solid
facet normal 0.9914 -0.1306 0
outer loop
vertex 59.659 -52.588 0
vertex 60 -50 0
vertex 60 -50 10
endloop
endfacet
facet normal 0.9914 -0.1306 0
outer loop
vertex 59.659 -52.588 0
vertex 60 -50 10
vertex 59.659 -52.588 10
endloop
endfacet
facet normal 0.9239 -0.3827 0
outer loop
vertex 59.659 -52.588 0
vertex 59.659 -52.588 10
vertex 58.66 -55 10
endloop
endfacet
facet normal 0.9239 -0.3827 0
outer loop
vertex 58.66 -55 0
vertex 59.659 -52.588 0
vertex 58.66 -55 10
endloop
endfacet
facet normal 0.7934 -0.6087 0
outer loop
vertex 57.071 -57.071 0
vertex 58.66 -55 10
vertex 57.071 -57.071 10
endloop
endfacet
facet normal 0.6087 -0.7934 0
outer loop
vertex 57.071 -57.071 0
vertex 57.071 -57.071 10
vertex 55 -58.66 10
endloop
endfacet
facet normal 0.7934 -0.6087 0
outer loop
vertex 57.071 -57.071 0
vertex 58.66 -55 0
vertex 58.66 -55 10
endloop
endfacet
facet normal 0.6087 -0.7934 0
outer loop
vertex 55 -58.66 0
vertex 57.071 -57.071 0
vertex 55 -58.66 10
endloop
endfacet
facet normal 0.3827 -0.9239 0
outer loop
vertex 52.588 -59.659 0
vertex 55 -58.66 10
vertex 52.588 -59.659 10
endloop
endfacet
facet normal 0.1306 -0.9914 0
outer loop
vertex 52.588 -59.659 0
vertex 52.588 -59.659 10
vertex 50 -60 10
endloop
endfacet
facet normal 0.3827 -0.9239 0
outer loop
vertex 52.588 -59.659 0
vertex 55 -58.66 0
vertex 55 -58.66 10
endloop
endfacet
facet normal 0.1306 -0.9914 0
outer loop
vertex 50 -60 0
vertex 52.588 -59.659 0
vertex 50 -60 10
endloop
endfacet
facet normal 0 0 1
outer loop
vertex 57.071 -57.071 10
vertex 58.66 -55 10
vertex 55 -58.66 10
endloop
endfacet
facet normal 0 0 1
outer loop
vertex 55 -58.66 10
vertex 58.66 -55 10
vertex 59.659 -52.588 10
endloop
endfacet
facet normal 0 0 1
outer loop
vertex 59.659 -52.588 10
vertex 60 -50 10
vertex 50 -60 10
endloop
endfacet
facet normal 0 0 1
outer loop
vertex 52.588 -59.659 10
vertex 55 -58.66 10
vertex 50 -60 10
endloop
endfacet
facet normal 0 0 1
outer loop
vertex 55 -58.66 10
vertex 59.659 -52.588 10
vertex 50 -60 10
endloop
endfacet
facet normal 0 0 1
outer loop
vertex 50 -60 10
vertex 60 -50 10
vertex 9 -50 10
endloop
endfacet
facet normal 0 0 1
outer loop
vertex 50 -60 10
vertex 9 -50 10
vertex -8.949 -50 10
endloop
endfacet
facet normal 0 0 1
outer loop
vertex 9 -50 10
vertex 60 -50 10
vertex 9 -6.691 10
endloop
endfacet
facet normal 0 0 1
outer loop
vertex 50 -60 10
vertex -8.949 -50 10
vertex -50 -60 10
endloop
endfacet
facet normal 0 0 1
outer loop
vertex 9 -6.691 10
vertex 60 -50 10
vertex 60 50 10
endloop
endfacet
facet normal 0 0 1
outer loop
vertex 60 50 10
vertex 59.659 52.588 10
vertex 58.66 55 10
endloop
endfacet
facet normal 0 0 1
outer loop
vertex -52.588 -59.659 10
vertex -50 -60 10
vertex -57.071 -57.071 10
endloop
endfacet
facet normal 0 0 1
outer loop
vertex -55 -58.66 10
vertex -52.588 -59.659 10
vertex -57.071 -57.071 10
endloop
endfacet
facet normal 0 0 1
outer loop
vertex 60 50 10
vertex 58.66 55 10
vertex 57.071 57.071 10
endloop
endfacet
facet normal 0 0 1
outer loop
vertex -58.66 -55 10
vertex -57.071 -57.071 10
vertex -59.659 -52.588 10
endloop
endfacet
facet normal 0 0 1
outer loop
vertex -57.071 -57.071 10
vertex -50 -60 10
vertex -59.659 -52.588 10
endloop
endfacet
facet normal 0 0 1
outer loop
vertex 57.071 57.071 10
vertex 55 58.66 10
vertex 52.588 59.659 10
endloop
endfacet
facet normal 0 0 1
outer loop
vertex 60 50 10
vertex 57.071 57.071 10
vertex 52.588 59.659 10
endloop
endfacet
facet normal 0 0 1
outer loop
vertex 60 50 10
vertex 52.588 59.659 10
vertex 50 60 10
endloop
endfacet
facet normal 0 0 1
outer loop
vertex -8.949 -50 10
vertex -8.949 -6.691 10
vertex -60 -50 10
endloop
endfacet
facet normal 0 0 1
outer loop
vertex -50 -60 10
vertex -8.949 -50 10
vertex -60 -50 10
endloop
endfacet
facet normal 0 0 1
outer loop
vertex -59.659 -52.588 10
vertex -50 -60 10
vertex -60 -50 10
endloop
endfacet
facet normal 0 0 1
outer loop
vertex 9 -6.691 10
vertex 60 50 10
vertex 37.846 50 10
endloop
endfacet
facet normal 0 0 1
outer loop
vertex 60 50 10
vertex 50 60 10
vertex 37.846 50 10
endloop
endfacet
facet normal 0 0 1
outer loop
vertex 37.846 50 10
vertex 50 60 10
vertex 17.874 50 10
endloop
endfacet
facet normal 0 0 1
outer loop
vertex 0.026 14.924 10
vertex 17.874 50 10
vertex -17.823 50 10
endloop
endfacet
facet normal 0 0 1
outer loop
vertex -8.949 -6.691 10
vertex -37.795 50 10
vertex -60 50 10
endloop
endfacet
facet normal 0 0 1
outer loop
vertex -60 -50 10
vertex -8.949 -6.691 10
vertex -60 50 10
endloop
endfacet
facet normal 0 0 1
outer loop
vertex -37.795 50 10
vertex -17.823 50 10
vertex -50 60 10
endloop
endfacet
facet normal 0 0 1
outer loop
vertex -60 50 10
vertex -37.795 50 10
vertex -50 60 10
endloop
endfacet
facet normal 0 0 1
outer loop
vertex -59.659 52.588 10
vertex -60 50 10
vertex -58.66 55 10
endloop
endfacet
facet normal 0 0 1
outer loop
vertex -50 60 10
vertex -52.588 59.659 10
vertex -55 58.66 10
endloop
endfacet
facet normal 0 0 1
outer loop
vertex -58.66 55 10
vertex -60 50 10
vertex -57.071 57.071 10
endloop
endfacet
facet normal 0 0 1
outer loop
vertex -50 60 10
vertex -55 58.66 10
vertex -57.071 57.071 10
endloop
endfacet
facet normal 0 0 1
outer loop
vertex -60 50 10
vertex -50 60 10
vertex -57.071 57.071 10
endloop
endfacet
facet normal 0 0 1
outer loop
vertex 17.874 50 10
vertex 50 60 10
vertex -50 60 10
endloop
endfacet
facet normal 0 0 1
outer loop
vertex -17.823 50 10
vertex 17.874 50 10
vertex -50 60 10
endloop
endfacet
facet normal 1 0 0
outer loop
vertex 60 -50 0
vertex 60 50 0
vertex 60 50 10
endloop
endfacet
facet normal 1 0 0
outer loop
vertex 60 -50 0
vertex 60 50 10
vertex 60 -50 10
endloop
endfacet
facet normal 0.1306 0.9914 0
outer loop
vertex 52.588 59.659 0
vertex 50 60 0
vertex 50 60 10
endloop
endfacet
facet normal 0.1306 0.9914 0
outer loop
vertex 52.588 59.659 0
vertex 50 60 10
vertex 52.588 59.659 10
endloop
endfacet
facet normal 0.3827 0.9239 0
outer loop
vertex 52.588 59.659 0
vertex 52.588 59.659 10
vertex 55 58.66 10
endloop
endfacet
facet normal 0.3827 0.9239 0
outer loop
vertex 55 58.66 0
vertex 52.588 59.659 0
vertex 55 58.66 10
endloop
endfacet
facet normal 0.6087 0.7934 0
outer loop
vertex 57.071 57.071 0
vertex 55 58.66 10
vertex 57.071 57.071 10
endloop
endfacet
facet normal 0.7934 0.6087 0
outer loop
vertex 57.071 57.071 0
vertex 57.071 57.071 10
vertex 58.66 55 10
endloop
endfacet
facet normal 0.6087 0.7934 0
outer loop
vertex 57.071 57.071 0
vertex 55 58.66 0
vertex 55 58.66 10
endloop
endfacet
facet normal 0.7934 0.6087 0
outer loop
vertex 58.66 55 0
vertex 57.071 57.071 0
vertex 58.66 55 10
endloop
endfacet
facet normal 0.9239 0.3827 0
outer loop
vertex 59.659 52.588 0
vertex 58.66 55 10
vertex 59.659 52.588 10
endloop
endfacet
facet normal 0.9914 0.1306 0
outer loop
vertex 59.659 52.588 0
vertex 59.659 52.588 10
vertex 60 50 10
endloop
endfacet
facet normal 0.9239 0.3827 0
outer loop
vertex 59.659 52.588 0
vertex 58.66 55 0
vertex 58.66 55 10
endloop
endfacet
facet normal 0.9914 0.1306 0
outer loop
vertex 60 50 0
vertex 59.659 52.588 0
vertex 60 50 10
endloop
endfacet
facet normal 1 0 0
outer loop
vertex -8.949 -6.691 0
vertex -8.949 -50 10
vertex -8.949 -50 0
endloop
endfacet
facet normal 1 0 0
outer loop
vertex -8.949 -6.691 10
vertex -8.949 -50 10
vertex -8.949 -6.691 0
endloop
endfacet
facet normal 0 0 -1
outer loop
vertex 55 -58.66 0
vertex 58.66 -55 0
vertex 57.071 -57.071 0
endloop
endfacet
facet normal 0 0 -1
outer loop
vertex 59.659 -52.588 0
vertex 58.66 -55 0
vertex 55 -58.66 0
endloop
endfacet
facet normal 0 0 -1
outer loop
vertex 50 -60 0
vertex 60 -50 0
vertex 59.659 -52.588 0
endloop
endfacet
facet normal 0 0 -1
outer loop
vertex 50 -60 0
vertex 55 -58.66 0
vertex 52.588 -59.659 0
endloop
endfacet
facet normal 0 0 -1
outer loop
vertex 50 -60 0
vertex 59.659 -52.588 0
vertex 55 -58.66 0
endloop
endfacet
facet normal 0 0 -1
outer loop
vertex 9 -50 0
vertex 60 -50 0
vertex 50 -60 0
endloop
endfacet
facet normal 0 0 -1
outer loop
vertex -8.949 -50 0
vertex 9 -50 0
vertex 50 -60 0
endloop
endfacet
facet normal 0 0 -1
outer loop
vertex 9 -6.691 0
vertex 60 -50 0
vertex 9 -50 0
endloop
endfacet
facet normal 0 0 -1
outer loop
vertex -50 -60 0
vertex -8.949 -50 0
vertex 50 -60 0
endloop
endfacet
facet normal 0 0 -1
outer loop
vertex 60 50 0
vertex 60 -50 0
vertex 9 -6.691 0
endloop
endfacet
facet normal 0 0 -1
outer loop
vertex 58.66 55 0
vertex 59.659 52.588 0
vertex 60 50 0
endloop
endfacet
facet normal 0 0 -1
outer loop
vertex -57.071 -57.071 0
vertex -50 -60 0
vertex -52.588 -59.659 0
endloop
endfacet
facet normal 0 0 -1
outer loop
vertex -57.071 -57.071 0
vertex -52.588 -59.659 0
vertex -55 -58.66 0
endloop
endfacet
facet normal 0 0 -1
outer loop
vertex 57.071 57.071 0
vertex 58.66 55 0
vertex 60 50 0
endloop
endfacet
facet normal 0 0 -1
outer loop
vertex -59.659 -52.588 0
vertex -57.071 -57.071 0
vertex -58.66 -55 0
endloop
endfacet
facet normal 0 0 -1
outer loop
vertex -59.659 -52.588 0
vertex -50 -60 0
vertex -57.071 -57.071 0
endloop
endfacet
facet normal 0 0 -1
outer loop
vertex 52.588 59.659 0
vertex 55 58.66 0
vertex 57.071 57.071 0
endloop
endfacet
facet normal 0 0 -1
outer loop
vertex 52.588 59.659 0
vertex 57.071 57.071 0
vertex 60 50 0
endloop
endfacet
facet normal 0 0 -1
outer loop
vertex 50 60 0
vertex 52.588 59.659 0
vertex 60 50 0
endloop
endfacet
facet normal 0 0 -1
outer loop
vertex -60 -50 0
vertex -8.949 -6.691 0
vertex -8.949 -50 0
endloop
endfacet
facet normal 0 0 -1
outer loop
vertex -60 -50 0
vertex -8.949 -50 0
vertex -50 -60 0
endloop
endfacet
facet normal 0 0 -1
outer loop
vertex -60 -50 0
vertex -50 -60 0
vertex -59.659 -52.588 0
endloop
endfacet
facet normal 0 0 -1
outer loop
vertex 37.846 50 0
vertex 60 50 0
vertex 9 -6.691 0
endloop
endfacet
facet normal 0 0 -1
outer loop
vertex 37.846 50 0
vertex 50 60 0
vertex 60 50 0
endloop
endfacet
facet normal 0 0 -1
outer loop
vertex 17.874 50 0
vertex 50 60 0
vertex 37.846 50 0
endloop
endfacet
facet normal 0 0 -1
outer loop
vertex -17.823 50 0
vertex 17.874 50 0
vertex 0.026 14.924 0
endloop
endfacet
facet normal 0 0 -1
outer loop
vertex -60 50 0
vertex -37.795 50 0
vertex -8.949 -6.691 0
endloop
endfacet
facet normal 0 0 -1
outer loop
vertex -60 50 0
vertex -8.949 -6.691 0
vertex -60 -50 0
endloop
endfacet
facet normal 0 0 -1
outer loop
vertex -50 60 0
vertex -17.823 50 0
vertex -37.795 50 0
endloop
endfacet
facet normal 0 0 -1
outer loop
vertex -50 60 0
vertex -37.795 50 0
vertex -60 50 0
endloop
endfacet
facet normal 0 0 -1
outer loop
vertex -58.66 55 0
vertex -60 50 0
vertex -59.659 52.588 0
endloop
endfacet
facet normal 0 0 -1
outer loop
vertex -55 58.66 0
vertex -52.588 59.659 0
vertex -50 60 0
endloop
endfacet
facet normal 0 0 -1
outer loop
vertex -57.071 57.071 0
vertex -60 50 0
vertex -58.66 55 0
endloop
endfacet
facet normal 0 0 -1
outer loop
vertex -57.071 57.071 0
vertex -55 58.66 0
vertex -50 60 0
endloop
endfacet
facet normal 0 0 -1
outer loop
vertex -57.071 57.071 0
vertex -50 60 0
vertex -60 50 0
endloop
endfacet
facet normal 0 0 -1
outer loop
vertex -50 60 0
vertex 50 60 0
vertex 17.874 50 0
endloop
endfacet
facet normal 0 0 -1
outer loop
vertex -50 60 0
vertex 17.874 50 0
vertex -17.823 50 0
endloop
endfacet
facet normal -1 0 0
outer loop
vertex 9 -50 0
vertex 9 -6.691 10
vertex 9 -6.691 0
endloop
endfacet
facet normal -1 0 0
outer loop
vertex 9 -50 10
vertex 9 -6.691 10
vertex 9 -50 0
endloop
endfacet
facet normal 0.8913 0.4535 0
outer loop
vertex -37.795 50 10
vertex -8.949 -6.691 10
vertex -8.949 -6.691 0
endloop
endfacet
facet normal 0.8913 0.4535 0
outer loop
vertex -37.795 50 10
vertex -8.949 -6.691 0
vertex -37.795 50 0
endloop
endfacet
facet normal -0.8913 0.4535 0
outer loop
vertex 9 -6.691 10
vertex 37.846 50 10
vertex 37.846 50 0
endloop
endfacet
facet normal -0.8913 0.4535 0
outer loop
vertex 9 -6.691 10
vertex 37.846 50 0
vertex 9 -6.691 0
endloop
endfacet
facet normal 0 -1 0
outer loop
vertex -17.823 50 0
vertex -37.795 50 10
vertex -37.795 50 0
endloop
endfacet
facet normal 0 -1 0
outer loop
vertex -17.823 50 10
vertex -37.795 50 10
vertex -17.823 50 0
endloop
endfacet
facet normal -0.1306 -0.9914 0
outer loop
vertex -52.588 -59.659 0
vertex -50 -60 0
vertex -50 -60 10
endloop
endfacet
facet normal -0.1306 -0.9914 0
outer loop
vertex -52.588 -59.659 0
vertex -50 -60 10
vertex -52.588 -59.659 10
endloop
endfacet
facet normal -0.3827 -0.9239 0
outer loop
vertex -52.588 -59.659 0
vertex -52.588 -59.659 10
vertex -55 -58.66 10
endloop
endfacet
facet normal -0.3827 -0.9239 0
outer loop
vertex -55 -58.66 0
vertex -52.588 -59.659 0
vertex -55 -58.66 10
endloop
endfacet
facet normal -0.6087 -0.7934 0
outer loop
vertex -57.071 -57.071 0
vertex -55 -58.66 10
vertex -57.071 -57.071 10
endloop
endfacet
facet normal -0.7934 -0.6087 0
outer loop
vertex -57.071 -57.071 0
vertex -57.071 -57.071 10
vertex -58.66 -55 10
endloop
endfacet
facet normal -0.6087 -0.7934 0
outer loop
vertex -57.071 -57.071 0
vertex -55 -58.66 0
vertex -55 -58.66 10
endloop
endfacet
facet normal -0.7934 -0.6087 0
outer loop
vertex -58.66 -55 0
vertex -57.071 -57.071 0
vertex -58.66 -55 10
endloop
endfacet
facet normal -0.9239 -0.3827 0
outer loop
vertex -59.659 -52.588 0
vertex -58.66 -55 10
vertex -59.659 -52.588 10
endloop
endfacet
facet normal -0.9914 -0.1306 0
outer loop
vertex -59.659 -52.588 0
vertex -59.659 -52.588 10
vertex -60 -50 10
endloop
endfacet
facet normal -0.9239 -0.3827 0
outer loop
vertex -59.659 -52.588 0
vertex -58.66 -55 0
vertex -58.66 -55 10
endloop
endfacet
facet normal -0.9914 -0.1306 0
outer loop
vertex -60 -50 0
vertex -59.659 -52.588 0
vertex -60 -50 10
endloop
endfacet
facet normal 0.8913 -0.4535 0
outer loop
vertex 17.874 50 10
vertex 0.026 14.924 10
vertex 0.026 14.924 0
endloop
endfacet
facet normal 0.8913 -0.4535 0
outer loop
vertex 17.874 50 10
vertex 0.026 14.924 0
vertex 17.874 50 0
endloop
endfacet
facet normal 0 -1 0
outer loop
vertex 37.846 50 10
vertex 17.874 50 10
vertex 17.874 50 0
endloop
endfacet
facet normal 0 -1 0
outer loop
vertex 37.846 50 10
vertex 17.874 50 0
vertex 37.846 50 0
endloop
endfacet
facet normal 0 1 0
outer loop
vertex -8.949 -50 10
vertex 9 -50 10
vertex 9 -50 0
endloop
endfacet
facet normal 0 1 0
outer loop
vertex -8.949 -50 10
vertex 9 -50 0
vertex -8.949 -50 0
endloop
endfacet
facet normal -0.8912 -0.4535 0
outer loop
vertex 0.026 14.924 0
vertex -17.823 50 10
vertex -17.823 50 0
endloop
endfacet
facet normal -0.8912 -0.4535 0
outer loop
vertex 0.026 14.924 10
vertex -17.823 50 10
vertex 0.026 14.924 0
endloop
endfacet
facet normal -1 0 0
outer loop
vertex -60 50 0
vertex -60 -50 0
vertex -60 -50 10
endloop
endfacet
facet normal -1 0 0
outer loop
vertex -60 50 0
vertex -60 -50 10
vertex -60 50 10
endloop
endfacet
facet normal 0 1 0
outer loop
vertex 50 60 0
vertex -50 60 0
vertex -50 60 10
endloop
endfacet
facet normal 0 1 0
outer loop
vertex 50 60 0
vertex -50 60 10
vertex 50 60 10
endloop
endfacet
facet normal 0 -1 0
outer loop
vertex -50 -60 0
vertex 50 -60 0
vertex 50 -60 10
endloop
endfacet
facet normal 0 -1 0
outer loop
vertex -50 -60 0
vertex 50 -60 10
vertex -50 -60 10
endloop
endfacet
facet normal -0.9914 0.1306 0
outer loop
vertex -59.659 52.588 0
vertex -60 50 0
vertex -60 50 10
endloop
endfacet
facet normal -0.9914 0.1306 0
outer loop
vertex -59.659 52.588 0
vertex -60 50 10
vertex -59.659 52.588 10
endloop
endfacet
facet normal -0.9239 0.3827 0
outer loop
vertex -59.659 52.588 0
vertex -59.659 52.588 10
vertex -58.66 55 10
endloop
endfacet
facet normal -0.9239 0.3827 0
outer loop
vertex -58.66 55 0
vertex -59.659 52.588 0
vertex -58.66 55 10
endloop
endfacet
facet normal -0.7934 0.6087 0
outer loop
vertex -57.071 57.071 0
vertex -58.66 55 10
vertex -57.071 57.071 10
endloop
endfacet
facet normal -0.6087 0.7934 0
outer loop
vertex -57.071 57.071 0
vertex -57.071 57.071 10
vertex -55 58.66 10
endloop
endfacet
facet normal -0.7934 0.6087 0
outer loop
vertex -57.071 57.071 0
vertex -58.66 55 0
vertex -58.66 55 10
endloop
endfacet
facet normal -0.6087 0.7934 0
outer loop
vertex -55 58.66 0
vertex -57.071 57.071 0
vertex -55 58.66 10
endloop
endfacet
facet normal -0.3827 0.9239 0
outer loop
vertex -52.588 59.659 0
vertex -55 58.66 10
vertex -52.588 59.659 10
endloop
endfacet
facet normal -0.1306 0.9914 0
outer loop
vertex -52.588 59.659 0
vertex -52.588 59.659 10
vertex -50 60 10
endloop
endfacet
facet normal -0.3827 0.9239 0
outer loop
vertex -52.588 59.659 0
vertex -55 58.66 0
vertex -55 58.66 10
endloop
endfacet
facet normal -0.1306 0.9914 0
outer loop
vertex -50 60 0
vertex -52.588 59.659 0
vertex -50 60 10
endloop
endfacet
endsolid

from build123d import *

# Parameters (mm, degrees)
BOSS_EXTRUDE1_DEPTH = 10
CUT_EXTRUDE38_DEPTH = 10


with BuildPart() as part:
    # Sketch1 → Boss-Extrude1 (new body)
    with BuildSketch(Plane.XY):
        with BuildLine():
            Line((-50, 60), (50, 60))
            ThreePointArc((50, 60), (57.071067812, 57.071067812), (60, 50))
            Line((60, 50), (60, -50))
            ThreePointArc((60, -50), (57.071067812, -57.071067812), (50, -60))
            Line((50, -60), (-50, -60))
            ThreePointArc((-50, -60), (-57.071067812, -57.071067812), (-60, -50))
            Line((-60, -50), (-60, 50))
            ThreePointArc((-60, 50), (-57.071067812, 57.071067812), (-50, 60))
        make_face()
    extrude(amount=BOSS_EXTRUDE1_DEPTH)

    # Sketch2 → Cut-Extrude38 (cut)
    with BuildSketch(Plane.XY.offset(10)):
        Polygon((-37.794871795, 50), (-17.822916667, 50), (0.025641026, 14.923878205), (17.874198718, 50), (37.846153846, 50), (9, -6.690705128), (9, -50), (-8.948717949, -50), (-8.948717949, -6.690705128), align=None)
    extrude(amount=-CUT_EXTRUDE38_DEPTH, mode=Mode.SUBTRACT)


solid = part.part
